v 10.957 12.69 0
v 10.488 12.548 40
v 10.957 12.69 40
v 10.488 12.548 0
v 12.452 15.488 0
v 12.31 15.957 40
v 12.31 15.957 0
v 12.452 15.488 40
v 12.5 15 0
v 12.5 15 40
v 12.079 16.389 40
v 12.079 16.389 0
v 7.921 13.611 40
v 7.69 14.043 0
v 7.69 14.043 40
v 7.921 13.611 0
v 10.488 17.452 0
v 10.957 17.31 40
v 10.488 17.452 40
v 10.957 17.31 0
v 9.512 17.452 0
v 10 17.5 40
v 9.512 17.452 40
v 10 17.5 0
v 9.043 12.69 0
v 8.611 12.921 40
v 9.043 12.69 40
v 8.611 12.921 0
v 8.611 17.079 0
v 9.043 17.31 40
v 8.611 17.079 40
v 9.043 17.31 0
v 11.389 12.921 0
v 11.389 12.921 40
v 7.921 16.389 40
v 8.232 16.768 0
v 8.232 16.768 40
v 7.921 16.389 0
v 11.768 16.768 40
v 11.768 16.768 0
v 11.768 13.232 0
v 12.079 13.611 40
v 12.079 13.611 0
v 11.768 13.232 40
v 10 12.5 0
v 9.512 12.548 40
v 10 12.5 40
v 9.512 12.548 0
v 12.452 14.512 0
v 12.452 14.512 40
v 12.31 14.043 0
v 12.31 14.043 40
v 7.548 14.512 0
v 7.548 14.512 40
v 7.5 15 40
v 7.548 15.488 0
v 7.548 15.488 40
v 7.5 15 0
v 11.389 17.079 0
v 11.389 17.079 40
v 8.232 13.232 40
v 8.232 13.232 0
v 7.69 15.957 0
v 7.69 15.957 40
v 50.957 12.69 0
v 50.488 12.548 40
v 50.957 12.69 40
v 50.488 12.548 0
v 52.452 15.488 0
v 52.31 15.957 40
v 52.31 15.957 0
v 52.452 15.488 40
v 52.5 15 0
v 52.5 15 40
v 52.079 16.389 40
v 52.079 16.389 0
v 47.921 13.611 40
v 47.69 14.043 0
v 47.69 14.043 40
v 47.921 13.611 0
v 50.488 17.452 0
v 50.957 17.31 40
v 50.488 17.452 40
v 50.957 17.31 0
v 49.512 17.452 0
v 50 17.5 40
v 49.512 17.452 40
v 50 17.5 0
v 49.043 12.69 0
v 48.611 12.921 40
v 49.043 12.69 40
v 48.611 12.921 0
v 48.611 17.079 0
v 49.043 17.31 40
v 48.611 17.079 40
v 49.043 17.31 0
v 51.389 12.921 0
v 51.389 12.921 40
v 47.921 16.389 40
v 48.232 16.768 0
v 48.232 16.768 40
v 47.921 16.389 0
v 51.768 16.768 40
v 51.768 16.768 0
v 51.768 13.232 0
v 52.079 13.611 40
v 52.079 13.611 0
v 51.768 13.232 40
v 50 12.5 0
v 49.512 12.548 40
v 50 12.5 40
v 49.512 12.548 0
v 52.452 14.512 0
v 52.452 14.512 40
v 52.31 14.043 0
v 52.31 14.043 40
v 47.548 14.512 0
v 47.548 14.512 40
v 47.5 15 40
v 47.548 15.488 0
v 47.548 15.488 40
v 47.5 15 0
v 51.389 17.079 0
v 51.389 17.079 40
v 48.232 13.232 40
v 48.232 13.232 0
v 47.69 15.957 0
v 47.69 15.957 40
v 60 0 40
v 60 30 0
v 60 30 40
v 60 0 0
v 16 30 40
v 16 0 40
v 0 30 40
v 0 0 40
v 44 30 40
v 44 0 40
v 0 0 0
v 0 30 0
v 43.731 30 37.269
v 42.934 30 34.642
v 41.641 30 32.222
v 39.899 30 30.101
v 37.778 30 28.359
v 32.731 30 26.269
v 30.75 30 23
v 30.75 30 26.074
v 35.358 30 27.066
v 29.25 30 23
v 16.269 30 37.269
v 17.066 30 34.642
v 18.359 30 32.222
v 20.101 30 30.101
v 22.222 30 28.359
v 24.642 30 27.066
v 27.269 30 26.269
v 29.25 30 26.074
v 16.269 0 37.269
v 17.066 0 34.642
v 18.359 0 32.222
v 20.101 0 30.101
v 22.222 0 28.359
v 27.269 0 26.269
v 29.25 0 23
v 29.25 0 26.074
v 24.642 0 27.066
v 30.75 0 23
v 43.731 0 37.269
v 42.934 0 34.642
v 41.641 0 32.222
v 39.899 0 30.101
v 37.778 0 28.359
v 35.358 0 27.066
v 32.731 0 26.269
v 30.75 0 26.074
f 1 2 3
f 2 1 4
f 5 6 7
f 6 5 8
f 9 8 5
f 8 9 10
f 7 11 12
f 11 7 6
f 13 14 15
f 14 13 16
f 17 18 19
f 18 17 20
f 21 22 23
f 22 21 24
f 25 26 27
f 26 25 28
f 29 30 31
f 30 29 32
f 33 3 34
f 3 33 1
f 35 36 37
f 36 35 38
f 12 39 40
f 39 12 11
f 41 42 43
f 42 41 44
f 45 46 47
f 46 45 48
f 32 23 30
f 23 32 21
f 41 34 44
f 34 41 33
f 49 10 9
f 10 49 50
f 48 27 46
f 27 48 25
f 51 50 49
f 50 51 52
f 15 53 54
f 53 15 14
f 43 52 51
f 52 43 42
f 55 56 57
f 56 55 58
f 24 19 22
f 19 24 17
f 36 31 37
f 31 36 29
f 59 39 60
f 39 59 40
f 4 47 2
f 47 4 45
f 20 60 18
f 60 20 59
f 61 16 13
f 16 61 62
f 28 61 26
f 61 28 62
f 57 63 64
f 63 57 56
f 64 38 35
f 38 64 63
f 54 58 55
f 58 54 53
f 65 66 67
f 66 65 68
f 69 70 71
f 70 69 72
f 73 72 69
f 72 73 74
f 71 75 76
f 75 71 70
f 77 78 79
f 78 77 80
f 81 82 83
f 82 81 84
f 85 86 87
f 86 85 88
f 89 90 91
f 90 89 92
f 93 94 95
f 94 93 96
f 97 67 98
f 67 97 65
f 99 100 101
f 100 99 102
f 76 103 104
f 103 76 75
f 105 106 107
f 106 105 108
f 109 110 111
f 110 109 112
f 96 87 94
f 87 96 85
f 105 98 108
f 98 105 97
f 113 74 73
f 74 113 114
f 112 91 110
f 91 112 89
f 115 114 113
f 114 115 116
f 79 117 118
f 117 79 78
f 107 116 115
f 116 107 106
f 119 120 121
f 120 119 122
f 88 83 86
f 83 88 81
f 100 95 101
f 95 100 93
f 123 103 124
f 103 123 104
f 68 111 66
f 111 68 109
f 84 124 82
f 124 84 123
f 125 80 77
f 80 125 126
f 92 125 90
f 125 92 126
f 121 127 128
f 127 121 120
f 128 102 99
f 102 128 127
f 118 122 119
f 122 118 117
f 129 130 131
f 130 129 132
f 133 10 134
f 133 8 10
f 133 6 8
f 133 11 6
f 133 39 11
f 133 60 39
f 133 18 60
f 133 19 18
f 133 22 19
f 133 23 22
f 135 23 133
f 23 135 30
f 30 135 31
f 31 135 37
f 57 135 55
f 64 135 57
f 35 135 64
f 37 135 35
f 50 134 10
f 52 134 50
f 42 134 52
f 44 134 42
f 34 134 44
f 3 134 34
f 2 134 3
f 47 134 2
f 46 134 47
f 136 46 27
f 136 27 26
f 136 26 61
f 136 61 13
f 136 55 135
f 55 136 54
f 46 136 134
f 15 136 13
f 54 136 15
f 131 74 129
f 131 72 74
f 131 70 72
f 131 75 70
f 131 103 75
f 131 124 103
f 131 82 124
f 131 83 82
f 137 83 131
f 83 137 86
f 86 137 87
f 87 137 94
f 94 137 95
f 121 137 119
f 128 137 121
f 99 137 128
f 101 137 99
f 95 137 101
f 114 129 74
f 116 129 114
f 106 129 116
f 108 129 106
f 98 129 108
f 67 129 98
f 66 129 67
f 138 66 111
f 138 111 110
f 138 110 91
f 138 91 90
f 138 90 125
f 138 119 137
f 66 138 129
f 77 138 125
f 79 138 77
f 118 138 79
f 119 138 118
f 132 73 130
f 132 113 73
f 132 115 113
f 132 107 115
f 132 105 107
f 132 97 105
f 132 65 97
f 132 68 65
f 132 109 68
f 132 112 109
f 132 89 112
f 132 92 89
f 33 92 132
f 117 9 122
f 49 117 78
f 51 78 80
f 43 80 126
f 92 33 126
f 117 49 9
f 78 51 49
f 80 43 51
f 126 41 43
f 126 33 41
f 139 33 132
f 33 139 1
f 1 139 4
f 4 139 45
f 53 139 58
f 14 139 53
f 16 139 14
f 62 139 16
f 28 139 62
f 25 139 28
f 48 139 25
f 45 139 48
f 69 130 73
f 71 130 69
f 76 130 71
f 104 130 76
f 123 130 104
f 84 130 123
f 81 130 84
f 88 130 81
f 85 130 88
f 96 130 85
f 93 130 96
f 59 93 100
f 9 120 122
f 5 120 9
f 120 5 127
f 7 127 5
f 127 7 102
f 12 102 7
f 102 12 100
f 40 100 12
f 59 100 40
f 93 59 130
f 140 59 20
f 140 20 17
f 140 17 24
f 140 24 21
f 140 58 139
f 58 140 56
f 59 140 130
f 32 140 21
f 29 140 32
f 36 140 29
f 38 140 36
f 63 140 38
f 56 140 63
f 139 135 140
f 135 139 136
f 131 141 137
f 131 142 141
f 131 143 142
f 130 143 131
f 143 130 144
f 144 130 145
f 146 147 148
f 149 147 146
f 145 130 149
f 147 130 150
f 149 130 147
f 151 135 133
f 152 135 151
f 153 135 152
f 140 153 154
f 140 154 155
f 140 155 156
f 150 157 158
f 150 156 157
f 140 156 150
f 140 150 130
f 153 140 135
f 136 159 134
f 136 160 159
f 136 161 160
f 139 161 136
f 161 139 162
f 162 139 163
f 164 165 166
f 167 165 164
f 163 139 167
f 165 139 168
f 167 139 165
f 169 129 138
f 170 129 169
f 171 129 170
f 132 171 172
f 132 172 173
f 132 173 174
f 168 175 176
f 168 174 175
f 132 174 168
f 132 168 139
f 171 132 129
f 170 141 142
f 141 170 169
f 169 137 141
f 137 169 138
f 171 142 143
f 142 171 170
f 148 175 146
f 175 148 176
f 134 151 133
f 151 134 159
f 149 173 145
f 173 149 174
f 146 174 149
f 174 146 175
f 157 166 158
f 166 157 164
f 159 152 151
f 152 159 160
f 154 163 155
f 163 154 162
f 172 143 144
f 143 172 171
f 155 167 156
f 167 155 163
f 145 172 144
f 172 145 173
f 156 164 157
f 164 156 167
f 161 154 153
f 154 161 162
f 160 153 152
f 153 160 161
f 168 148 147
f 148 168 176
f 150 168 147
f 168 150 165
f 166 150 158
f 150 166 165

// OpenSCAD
$fn = 32;

// ----------------------------------------------------------------------
// Saddle clamp: split shaft clamp
// ----------------------------------------------------------------------

// --- parameters (mm) ---
blk_l = 60;               // block length, X
blk_w = 30;               // block width, Y
blk_h = 40;               // block height
clamp_r = 14;             // shaft groove radius
hole_r = 2.5;             // bolt hole radius
hole_m = 10;              // bolt hole margin from the ends
saw_w = 1.5;              // saw kerf width

saw_depth = clamp_r + 3;  // saw kerf depth

difference() {
  cube([blk_l, blk_w, blk_h]);
  translate([blk_l / 2, -1, blk_h])
    rotate([-90, 0, 0])
      cylinder(h = blk_w + 2, r = clamp_r);
  for (sx = [0, 1])
    translate([sx ? blk_l - hole_m : hole_m, blk_w / 2, -1])
      cylinder(r = hole_r, h = blk_h + 2);
  translate([blk_l / 2 - saw_w / 2, -1, blk_h - saw_depth])
    cube([saw_w, blk_w + 2, saw_depth + 1]);
}
